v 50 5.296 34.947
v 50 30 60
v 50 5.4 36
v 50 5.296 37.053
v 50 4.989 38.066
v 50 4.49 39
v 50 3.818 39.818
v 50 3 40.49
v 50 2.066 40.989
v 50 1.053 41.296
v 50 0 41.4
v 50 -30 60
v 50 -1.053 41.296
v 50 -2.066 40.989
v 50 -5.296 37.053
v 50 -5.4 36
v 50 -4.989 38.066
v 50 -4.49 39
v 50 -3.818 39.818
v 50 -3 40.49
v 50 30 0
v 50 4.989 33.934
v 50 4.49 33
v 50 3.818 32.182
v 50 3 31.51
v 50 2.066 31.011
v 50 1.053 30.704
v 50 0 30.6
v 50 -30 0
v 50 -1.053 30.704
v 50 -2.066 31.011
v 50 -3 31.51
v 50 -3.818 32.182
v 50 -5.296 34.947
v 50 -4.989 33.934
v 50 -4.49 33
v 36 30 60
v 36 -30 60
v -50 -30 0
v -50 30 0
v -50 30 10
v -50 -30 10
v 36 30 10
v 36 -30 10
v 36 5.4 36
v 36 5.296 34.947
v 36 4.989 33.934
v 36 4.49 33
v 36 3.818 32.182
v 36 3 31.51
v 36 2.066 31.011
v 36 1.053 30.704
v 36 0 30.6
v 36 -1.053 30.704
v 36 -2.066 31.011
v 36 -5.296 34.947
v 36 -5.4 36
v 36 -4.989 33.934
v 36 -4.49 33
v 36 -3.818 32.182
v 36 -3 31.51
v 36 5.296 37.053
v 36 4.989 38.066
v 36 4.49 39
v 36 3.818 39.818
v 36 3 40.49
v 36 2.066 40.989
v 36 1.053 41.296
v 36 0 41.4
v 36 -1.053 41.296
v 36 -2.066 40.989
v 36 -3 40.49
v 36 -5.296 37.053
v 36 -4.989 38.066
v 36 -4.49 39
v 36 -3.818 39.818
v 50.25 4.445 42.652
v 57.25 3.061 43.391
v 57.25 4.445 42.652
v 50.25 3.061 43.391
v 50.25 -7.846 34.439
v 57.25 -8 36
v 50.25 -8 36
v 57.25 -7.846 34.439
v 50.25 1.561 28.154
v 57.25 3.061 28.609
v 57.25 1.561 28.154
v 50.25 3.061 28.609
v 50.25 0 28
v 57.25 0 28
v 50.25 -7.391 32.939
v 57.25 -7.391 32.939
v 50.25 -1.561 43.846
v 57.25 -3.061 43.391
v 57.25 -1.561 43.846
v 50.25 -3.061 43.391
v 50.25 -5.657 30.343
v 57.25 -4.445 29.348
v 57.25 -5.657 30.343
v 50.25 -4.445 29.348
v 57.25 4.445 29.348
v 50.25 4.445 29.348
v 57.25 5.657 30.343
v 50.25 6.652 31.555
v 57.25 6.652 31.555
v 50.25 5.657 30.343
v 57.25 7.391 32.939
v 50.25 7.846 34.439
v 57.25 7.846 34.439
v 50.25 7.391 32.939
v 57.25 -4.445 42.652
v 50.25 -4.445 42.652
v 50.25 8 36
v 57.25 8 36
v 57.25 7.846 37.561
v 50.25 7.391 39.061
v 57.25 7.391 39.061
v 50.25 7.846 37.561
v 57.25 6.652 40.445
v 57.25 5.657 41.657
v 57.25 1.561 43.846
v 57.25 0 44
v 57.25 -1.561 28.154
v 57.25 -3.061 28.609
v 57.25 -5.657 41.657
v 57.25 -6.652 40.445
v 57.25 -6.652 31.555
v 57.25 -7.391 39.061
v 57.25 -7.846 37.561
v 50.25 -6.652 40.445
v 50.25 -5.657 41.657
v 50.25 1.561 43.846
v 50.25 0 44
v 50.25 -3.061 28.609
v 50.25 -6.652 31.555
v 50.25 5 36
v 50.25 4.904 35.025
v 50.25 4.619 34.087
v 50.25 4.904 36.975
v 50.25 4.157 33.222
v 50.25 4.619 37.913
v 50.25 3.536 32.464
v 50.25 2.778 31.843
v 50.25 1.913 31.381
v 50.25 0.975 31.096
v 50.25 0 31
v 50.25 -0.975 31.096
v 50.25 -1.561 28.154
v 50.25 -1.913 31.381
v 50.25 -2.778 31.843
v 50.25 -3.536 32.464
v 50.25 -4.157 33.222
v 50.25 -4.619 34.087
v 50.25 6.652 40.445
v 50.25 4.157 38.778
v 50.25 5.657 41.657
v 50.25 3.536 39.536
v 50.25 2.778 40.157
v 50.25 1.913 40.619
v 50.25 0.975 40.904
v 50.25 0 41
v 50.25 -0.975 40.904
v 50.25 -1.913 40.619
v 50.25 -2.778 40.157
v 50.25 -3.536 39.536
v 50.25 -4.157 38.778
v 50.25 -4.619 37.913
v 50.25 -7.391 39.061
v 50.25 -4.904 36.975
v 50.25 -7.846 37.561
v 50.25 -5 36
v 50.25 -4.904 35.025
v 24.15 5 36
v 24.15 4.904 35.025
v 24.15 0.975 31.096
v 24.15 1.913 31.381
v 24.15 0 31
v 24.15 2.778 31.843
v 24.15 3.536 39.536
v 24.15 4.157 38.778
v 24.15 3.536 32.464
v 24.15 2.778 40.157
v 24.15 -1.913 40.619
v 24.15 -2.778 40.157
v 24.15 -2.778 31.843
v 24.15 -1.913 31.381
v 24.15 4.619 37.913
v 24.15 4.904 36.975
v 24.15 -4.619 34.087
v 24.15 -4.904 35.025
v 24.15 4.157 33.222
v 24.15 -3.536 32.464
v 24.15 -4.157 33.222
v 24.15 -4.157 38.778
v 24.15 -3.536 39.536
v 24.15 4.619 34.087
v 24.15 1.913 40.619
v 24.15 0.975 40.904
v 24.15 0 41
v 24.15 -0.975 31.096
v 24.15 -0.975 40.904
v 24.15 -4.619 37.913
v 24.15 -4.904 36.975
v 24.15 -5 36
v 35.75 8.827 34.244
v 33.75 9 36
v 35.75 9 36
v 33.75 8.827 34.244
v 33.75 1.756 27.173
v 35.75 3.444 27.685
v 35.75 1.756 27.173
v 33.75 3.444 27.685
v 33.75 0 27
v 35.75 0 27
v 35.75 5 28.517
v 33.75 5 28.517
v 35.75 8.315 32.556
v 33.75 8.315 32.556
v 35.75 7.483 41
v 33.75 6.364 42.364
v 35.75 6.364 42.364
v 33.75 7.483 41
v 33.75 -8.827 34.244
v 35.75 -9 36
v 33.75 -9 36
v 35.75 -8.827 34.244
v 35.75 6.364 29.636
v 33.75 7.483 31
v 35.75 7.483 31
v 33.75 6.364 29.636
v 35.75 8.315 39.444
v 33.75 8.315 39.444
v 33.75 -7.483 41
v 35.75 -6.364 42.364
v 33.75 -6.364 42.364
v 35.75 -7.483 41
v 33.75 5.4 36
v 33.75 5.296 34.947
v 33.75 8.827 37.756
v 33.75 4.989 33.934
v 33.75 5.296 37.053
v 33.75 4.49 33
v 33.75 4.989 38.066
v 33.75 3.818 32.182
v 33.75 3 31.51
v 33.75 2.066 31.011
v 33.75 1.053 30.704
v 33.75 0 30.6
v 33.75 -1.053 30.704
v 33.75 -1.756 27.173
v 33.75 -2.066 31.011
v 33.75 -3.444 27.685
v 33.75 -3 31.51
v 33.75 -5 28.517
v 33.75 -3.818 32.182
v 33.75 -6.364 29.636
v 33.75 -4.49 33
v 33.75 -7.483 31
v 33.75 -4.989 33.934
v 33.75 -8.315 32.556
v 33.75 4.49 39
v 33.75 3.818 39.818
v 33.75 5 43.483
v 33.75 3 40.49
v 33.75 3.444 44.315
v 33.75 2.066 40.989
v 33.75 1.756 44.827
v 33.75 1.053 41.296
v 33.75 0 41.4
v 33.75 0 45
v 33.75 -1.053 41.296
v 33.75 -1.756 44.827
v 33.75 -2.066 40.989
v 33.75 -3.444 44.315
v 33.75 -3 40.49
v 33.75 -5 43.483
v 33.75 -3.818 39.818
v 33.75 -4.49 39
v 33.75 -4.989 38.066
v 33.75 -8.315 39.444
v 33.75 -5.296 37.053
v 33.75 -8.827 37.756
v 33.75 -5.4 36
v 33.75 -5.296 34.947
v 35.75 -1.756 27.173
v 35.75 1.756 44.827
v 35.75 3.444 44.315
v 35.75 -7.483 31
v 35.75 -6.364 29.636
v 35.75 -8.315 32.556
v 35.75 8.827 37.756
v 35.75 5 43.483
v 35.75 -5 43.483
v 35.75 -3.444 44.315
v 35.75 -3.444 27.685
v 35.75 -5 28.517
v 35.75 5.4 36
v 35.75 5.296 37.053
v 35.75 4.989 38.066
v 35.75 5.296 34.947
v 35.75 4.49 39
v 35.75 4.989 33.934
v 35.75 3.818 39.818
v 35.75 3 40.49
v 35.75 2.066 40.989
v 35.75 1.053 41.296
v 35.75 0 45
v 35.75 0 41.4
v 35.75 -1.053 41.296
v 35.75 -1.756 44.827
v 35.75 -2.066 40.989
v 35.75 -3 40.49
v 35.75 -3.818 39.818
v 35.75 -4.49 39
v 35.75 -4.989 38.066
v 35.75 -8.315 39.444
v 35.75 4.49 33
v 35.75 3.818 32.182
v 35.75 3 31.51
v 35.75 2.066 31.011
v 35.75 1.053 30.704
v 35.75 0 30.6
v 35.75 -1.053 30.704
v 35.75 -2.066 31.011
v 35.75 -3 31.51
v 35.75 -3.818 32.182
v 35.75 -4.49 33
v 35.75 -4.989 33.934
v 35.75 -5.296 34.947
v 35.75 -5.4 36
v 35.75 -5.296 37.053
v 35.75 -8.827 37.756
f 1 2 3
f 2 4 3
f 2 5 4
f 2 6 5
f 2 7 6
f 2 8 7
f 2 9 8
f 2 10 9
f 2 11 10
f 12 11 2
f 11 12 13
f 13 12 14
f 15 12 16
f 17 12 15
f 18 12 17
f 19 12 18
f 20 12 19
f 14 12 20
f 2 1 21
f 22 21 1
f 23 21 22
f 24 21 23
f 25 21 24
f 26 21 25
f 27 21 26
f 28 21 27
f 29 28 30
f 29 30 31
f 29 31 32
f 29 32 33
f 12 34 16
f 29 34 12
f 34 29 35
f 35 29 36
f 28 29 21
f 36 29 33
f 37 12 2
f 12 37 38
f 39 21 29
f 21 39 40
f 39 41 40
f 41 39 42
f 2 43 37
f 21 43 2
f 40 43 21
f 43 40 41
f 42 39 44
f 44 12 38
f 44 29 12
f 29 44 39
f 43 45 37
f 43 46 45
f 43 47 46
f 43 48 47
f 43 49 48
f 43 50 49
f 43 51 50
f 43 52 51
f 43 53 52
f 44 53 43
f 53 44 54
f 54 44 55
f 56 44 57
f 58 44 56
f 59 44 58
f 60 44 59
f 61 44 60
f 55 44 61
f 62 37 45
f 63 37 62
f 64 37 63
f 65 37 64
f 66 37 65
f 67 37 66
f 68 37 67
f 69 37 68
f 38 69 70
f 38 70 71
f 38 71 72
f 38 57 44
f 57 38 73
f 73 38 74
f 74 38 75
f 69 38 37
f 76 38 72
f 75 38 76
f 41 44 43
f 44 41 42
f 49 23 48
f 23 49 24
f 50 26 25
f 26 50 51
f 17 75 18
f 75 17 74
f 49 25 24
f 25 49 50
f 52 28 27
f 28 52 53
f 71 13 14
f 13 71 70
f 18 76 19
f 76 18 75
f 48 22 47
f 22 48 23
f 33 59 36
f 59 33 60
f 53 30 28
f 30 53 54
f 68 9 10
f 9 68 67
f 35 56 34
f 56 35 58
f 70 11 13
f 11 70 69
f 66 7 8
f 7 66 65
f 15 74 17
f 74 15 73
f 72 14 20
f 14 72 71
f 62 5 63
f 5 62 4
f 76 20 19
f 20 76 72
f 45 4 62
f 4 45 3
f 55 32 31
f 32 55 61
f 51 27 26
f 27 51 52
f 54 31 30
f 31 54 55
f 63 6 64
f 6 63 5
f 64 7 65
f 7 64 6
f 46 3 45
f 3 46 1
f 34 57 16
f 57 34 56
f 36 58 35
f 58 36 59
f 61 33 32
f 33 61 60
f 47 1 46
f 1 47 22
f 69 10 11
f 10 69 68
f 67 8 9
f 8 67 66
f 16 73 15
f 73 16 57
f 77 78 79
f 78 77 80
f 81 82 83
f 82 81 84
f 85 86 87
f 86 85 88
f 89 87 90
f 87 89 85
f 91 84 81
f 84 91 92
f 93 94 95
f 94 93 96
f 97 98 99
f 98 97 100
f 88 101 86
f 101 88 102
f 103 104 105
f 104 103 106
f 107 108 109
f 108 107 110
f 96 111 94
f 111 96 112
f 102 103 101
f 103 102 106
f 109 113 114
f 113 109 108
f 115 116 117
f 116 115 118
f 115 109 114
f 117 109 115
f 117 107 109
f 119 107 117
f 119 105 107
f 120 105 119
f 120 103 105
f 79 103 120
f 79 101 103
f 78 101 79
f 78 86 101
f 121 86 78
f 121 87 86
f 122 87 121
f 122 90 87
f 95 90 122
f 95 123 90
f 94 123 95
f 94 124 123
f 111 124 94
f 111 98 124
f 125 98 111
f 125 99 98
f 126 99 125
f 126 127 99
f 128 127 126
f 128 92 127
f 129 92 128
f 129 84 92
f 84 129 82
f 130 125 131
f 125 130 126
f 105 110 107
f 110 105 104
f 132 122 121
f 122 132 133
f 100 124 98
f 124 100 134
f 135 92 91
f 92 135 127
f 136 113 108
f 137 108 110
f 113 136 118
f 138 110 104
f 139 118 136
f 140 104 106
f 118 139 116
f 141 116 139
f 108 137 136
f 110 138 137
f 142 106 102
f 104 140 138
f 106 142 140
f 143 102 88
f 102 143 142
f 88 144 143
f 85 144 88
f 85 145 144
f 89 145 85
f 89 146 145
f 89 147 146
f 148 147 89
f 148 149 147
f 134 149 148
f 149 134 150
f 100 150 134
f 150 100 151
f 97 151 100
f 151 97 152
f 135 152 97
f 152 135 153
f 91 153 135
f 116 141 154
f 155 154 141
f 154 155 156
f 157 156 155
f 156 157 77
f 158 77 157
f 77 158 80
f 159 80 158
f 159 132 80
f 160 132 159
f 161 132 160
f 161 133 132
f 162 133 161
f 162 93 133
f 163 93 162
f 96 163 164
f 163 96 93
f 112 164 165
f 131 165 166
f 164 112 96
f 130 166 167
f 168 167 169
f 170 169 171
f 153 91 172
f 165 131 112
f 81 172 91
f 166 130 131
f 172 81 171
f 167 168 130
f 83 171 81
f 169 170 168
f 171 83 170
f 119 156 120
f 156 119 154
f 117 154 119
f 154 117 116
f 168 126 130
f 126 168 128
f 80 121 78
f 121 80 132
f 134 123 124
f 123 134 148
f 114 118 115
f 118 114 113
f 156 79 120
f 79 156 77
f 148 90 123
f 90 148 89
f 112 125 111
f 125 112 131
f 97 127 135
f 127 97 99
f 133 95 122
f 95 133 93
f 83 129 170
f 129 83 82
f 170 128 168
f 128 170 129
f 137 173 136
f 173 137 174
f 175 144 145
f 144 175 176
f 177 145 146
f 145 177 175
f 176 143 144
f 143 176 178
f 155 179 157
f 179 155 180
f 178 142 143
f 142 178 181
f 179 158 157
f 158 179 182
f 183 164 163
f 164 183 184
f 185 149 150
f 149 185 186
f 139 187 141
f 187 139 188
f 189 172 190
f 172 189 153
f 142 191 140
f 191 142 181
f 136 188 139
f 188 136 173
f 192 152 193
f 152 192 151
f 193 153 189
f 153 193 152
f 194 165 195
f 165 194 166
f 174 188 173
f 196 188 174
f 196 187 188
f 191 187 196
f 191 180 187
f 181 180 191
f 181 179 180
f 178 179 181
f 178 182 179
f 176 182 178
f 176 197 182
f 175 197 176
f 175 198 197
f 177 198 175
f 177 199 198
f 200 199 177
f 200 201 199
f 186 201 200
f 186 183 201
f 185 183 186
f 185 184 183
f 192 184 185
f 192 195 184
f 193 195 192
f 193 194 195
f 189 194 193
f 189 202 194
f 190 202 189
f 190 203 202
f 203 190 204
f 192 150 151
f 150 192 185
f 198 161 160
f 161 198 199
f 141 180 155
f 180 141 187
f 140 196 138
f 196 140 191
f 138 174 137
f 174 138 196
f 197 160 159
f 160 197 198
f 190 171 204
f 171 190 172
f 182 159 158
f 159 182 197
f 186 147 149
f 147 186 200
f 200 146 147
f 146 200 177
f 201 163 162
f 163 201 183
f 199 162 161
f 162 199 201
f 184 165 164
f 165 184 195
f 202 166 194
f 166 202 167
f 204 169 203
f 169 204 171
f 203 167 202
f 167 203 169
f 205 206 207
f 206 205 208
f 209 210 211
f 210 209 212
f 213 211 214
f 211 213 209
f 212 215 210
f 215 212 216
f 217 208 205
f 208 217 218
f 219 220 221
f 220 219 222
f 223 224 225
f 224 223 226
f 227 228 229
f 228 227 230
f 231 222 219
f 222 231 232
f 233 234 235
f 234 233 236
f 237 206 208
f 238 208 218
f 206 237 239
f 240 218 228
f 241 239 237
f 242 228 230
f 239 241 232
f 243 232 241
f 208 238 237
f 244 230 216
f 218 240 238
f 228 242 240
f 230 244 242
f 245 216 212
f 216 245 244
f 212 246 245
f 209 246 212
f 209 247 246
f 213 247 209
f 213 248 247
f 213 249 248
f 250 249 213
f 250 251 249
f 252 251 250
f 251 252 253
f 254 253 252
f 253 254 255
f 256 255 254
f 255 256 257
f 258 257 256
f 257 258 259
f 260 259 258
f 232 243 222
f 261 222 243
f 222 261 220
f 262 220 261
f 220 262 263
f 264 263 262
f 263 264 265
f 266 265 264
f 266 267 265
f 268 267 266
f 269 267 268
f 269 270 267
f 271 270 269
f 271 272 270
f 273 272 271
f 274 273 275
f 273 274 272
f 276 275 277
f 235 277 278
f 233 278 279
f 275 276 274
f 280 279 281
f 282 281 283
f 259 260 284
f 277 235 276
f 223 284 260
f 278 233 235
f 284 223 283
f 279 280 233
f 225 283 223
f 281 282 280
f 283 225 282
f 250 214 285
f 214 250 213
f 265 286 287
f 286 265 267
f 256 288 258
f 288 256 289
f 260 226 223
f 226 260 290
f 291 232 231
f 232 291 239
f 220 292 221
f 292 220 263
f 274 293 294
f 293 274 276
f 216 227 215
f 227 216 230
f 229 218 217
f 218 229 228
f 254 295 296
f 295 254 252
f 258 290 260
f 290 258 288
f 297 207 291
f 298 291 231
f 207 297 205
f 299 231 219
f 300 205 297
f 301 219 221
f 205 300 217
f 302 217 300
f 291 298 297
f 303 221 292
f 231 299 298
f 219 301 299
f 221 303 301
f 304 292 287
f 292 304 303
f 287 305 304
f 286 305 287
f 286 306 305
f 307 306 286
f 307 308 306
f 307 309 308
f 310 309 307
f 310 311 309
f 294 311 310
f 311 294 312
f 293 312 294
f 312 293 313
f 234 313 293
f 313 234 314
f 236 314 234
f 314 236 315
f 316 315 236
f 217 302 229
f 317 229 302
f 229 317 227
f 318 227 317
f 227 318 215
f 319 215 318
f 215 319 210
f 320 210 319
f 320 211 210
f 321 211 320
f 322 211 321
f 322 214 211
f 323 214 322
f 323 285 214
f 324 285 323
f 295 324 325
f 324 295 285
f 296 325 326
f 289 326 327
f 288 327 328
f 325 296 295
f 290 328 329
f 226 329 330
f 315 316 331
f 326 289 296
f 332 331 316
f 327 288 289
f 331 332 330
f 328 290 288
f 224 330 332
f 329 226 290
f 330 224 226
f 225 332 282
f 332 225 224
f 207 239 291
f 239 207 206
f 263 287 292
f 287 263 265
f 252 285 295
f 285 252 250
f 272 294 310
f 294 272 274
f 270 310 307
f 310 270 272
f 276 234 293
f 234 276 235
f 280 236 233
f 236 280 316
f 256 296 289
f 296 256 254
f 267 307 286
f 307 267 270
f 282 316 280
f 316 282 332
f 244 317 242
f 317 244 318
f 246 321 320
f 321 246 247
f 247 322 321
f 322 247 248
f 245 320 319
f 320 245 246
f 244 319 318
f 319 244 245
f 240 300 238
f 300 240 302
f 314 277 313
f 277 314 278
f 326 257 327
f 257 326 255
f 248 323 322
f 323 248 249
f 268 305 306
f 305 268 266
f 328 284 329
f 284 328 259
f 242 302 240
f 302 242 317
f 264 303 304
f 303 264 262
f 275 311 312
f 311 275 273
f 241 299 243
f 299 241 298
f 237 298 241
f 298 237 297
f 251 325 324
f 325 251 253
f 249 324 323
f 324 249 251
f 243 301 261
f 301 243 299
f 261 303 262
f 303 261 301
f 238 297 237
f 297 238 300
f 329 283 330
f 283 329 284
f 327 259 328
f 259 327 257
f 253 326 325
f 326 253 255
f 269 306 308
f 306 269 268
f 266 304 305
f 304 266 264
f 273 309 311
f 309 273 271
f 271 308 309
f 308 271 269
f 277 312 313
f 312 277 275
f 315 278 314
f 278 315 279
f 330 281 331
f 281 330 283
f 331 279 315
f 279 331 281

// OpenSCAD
$fn = 32;

// ------------------------------------------------------------------------
// Bolted bracket: 100 x 60 mm bracket with 1 bolt joints
// Every part is its own module, assembly() places them once.
// ------------------------------------------------------------------------

// --- part 1 ---
module bracket() {
  difference() {
    translate([-50, -30, 0]) cube([100, 60, 60]);
    translate([-51, -31, 10]) cube([87, 62, 51]);
    translate([43, 0, 36]) rotate([0, 90, 0]) cylinder(h = 16, d = 10.8, center = true);
  }
}

// --- part 2 ---
module bolt() {
  cylinder(h = 7, d = 16);
  translate([0, 0, -26.1]) cylinder(h = 26.1, d = 10);
}

// --- part 3 ---
module washer() {
  difference() {
      translate([0, 0, 0]) cylinder(h = 2, d = 18);
      translate([0, 0, -1]) cylinder(h = 4, d = 10.8);
    }
}

// --- assembly ---
module assembly() {
  translate([0, 0, 0]) rotate([0, 0, 0]) bracket();
  translate([50.25, 0, 36]) rotate([0, 90, 0]) bolt();
  translate([33.75, 0, 36]) rotate([0, 90, 0]) washer();
}

assembly();
